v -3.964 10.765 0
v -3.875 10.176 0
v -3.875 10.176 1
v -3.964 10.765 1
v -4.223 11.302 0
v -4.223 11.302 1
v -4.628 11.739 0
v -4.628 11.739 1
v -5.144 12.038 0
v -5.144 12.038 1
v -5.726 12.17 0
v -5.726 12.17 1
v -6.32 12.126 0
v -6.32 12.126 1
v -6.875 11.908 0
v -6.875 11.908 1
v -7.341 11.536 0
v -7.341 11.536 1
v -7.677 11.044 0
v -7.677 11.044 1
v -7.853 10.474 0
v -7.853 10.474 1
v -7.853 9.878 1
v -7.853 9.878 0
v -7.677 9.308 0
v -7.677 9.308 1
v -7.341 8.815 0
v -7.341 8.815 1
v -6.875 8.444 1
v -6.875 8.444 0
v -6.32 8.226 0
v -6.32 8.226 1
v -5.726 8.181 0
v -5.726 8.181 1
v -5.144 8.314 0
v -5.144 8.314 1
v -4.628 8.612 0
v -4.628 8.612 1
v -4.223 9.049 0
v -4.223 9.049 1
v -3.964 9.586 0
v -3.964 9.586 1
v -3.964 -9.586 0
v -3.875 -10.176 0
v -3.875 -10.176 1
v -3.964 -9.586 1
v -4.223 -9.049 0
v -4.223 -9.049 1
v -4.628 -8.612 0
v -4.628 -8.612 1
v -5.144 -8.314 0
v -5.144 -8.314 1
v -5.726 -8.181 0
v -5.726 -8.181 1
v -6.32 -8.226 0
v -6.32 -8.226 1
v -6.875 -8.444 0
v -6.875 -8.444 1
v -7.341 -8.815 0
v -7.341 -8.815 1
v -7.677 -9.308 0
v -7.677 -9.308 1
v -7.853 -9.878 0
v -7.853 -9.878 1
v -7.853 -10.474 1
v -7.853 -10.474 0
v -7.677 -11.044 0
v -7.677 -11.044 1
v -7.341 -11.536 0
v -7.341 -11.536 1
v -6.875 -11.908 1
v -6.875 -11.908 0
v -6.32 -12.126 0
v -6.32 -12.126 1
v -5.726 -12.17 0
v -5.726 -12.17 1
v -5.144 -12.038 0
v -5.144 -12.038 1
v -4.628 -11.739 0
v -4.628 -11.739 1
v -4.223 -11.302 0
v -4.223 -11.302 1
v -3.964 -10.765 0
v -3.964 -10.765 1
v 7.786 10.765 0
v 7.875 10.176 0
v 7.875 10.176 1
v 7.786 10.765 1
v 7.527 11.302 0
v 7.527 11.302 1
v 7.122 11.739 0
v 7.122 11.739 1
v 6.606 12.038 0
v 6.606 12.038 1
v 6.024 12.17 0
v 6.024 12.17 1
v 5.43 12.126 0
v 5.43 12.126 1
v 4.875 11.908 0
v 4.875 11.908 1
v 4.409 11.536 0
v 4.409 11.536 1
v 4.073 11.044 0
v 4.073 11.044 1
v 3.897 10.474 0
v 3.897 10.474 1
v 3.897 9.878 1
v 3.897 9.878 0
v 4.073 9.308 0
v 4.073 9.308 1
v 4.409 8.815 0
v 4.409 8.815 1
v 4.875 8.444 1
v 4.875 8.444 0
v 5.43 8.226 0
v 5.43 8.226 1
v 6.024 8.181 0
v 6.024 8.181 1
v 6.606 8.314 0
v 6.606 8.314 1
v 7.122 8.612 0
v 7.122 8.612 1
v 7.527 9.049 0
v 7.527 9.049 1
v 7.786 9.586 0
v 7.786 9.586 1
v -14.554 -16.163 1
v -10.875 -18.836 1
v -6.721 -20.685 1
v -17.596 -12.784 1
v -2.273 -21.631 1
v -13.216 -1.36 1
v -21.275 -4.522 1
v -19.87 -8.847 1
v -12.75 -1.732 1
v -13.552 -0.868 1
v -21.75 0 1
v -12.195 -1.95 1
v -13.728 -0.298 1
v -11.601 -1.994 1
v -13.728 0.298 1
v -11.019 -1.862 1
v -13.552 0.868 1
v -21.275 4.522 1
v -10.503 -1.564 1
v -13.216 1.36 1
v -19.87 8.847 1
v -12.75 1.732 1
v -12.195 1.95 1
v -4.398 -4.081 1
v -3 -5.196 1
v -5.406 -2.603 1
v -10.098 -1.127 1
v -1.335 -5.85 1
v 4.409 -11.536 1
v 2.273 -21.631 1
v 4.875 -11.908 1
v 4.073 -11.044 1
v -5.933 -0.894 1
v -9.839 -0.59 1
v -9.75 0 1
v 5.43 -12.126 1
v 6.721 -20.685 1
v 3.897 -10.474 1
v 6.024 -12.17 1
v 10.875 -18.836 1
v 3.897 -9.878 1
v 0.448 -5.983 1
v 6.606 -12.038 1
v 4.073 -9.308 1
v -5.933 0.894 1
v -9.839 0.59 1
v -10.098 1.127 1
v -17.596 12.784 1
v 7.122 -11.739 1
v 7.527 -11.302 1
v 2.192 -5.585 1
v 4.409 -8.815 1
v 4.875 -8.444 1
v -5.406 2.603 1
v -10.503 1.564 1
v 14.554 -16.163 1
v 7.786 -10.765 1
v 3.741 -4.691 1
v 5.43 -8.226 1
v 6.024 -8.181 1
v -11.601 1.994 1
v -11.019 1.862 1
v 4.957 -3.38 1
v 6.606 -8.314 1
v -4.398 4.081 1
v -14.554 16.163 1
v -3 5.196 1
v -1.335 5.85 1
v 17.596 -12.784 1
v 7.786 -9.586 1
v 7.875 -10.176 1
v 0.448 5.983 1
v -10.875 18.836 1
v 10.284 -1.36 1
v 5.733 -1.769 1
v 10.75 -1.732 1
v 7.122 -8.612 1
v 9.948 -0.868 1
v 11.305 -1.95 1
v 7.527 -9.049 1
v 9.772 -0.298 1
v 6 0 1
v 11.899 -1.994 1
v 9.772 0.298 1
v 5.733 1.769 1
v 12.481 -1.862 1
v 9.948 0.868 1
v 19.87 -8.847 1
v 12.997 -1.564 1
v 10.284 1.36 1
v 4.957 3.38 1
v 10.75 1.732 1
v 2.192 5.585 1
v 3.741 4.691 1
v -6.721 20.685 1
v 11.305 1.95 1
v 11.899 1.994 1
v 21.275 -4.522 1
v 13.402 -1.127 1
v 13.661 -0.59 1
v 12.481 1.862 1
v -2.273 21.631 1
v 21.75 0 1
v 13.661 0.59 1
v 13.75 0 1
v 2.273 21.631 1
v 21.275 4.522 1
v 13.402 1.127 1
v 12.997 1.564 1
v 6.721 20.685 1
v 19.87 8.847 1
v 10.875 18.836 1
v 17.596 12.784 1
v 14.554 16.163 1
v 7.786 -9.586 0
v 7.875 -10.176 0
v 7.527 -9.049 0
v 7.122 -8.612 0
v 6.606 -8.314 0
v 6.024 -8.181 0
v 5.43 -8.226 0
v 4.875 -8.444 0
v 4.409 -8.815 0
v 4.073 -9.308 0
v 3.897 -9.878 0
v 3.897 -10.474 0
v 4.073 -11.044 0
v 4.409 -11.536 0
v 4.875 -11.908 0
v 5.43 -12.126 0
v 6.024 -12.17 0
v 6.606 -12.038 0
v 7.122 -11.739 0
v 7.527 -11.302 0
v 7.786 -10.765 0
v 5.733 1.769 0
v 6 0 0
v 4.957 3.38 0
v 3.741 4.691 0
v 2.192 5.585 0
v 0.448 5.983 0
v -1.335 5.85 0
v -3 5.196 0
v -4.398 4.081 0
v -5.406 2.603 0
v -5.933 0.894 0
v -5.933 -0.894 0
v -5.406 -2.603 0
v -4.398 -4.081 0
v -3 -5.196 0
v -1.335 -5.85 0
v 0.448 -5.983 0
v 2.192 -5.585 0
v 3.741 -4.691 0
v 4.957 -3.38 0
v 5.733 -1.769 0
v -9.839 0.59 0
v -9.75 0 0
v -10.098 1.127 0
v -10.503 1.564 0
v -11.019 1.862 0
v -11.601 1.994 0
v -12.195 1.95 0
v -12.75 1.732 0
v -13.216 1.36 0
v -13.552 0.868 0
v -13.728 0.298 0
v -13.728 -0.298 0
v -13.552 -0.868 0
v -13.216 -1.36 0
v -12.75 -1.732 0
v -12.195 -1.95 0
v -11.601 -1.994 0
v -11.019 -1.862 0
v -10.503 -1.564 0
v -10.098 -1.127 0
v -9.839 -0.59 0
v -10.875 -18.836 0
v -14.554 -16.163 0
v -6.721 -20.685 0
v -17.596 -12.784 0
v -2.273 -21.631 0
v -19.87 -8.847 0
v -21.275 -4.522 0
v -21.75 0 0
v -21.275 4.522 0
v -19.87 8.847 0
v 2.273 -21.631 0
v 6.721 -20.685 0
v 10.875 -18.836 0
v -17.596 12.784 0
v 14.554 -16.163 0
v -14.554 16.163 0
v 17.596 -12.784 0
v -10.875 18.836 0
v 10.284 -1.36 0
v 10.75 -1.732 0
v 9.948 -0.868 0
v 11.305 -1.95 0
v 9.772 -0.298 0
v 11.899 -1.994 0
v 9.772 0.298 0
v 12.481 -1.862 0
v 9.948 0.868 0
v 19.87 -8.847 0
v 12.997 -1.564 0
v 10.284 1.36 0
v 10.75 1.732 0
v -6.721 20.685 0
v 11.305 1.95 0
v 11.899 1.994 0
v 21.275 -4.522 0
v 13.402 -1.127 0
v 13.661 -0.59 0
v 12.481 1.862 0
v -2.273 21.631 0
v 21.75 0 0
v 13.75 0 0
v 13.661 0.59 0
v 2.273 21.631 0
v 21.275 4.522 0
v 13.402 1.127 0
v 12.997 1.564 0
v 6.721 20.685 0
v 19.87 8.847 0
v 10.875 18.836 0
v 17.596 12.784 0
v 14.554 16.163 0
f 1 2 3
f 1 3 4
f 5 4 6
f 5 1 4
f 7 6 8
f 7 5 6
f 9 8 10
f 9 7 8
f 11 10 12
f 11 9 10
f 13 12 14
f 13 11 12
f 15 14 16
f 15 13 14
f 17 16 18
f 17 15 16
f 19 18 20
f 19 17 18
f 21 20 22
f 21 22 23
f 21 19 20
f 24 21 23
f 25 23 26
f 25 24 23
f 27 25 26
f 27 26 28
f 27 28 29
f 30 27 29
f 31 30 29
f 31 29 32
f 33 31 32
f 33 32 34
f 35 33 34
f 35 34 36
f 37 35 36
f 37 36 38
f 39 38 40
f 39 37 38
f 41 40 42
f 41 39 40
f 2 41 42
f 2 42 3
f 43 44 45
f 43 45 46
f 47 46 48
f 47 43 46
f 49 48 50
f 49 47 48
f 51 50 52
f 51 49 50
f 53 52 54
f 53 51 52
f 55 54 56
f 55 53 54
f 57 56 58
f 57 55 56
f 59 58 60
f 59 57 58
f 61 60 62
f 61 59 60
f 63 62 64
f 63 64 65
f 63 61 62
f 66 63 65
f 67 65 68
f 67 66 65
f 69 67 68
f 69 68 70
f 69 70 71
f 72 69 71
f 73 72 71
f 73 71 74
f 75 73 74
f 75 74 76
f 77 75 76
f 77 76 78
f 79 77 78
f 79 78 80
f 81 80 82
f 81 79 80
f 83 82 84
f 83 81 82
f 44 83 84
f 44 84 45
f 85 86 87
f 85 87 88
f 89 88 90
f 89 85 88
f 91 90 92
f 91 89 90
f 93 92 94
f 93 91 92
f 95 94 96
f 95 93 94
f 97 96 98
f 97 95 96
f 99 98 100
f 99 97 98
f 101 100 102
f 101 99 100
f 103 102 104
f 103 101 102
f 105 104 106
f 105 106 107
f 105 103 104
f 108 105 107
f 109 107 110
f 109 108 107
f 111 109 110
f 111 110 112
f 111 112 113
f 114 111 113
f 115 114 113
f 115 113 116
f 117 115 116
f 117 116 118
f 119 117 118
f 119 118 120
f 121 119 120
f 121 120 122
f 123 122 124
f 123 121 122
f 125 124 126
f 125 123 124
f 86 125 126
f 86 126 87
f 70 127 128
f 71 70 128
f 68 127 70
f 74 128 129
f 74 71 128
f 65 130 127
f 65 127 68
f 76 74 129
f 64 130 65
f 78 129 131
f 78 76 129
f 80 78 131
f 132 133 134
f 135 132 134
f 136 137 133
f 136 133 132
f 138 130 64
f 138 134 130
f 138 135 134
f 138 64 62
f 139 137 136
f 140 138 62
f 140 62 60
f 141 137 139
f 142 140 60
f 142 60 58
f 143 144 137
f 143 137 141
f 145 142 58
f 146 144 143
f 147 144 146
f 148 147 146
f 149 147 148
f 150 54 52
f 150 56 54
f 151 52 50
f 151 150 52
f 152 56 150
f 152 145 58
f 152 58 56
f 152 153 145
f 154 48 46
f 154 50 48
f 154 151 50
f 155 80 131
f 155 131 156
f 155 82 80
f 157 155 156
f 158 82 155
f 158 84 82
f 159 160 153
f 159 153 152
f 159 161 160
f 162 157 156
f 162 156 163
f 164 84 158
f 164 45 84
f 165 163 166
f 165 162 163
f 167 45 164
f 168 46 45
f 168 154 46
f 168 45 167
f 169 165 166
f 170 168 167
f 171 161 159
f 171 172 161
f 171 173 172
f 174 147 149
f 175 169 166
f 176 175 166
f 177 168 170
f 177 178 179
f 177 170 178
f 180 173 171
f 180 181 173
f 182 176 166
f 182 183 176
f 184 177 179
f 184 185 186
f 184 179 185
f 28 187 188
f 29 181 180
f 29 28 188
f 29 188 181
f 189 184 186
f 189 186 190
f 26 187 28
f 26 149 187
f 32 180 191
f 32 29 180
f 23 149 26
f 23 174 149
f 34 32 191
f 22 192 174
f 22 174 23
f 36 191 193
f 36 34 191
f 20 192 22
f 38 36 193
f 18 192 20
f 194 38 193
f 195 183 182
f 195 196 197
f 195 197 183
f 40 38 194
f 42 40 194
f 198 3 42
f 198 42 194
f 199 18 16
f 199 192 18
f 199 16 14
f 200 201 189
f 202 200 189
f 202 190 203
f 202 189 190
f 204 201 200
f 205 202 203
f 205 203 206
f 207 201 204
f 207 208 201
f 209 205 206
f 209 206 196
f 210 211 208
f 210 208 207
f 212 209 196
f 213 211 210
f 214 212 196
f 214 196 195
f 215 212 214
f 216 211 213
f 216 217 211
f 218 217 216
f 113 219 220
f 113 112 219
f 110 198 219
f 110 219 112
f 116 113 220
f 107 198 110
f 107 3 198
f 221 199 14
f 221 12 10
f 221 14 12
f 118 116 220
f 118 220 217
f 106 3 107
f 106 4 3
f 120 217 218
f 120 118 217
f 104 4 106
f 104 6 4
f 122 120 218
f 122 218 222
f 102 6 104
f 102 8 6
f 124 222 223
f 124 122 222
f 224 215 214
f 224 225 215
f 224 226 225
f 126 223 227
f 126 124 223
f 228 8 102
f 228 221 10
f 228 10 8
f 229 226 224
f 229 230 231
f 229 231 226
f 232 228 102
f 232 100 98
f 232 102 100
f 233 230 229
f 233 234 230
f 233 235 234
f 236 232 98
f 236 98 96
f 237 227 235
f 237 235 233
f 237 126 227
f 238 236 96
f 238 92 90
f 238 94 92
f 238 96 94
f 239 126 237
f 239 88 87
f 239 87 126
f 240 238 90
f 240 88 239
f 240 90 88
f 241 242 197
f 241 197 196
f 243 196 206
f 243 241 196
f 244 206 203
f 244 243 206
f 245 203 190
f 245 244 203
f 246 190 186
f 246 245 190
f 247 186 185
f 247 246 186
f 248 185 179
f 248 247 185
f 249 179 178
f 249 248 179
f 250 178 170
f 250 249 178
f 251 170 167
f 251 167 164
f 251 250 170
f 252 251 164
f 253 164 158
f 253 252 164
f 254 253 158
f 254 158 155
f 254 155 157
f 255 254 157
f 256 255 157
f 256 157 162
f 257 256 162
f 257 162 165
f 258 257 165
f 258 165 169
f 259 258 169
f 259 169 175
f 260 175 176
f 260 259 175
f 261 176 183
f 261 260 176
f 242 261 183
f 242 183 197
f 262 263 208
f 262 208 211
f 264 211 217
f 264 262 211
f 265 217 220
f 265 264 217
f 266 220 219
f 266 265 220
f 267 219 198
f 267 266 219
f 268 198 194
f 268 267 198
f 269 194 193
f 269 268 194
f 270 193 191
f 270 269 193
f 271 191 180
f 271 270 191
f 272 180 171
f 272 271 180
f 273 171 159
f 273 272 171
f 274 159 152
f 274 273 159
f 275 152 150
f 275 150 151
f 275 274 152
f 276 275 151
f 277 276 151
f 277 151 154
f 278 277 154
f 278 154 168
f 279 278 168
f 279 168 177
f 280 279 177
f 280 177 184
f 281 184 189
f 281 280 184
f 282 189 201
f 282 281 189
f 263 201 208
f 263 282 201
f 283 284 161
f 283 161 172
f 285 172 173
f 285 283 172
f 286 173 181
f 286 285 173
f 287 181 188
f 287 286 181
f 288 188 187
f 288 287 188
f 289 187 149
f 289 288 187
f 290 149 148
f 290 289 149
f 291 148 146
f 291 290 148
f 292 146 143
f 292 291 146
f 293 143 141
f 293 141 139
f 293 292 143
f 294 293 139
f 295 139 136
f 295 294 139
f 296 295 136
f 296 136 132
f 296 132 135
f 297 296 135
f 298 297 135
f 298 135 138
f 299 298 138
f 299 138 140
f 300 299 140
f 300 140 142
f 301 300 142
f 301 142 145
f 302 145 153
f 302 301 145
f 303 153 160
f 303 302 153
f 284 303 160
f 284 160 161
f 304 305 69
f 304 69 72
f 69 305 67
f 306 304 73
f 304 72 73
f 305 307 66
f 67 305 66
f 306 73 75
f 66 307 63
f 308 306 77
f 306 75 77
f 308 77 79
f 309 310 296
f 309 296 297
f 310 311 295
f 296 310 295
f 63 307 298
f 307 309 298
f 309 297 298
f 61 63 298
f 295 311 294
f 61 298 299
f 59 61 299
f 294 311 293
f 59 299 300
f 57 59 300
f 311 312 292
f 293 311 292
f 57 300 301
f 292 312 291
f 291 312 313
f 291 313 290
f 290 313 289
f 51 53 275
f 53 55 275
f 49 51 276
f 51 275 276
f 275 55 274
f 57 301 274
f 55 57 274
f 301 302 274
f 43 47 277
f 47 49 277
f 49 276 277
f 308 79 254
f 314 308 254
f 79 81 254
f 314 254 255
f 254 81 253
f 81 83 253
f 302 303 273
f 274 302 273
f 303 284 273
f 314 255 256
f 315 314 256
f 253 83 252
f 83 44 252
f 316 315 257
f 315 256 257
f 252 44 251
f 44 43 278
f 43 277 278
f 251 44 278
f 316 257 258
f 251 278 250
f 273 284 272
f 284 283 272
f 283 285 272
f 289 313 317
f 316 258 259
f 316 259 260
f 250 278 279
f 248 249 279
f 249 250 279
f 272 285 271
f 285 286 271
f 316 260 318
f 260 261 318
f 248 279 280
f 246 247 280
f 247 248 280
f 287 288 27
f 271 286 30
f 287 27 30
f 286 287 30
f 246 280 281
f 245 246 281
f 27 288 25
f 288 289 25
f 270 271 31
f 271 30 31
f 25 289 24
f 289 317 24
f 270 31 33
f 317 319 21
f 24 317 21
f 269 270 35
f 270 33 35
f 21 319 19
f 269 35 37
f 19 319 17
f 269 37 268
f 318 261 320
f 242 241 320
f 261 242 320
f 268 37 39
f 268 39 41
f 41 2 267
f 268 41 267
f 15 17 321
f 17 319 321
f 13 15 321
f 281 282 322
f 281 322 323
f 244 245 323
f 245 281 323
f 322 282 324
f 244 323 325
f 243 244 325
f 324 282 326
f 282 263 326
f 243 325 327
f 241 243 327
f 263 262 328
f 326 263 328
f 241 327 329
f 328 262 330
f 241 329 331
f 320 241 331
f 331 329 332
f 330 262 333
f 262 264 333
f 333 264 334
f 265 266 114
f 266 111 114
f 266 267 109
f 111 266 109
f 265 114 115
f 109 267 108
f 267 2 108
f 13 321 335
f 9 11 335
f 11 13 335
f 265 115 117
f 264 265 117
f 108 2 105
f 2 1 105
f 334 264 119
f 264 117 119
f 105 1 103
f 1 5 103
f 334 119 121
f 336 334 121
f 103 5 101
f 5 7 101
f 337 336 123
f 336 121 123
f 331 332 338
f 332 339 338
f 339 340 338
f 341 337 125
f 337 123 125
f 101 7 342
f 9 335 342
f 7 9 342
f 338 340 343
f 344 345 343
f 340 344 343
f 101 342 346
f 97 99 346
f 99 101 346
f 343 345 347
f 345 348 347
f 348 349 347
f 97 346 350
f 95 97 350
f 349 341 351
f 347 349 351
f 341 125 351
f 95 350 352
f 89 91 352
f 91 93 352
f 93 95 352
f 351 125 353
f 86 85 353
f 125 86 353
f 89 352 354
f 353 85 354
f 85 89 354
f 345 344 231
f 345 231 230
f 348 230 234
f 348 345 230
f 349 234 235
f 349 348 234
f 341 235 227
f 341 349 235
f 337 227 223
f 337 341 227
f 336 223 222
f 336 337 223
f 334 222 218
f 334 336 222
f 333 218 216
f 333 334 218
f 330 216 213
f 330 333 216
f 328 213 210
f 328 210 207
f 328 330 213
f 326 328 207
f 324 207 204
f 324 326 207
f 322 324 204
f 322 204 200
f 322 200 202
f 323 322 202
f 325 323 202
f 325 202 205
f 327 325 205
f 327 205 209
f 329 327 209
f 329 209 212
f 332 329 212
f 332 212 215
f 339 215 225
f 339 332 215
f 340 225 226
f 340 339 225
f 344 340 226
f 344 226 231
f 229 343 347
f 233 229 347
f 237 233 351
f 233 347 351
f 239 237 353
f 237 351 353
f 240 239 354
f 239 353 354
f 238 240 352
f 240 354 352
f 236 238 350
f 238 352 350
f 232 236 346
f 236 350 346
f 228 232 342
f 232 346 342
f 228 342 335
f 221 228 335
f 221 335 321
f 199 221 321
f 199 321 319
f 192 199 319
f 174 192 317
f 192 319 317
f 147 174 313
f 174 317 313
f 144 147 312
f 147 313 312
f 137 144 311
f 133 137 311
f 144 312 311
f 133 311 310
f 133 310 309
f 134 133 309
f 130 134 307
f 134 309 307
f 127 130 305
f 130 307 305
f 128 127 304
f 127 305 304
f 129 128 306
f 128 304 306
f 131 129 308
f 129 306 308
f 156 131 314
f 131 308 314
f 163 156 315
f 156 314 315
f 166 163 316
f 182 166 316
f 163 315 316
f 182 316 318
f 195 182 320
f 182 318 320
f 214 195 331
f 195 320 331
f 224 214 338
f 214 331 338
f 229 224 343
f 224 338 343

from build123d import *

# Parameters (mm, degrees)
SKIZZE1_R                       = 21.75
SKIZZE1_R_2                     = 2
SKIZZE1_R_3                     = 6
AUFSATZ_LINEAR_AUSTRAGEN1_DEPTH = 1


with BuildPart() as part:
    # Skizze1 → Aufsatz-Linear austragen1 (new body)
    with BuildSketch(Plane.XY):
        Circle(SKIZZE1_R)
        with Locations((11.75, 0)):
            Circle(SKIZZE1_R_2, mode=Mode.SUBTRACT)
        with Locations((5.875, -10.175798494)):
            Circle(SKIZZE1_R_2, mode=Mode.SUBTRACT)
        with Locations((-5.875, -10.175798494)):
            Circle(SKIZZE1_R_2, mode=Mode.SUBTRACT)
        with Locations((-11.75, 0)):
            Circle(SKIZZE1_R_2, mode=Mode.SUBTRACT)
        with Locations((-5.875, 10.175798494)):
            Circle(SKIZZE1_R_2, mode=Mode.SUBTRACT)
        with Locations((5.875, 10.175798494)):
            Circle(SKIZZE1_R_2, mode=Mode.SUBTRACT)
        Circle(SKIZZE1_R_3, mode=Mode.SUBTRACT)
    extrude(amount=AUFSATZ_LINEAR_AUSTRAGEN1_DEPTH)


solid = part.part
